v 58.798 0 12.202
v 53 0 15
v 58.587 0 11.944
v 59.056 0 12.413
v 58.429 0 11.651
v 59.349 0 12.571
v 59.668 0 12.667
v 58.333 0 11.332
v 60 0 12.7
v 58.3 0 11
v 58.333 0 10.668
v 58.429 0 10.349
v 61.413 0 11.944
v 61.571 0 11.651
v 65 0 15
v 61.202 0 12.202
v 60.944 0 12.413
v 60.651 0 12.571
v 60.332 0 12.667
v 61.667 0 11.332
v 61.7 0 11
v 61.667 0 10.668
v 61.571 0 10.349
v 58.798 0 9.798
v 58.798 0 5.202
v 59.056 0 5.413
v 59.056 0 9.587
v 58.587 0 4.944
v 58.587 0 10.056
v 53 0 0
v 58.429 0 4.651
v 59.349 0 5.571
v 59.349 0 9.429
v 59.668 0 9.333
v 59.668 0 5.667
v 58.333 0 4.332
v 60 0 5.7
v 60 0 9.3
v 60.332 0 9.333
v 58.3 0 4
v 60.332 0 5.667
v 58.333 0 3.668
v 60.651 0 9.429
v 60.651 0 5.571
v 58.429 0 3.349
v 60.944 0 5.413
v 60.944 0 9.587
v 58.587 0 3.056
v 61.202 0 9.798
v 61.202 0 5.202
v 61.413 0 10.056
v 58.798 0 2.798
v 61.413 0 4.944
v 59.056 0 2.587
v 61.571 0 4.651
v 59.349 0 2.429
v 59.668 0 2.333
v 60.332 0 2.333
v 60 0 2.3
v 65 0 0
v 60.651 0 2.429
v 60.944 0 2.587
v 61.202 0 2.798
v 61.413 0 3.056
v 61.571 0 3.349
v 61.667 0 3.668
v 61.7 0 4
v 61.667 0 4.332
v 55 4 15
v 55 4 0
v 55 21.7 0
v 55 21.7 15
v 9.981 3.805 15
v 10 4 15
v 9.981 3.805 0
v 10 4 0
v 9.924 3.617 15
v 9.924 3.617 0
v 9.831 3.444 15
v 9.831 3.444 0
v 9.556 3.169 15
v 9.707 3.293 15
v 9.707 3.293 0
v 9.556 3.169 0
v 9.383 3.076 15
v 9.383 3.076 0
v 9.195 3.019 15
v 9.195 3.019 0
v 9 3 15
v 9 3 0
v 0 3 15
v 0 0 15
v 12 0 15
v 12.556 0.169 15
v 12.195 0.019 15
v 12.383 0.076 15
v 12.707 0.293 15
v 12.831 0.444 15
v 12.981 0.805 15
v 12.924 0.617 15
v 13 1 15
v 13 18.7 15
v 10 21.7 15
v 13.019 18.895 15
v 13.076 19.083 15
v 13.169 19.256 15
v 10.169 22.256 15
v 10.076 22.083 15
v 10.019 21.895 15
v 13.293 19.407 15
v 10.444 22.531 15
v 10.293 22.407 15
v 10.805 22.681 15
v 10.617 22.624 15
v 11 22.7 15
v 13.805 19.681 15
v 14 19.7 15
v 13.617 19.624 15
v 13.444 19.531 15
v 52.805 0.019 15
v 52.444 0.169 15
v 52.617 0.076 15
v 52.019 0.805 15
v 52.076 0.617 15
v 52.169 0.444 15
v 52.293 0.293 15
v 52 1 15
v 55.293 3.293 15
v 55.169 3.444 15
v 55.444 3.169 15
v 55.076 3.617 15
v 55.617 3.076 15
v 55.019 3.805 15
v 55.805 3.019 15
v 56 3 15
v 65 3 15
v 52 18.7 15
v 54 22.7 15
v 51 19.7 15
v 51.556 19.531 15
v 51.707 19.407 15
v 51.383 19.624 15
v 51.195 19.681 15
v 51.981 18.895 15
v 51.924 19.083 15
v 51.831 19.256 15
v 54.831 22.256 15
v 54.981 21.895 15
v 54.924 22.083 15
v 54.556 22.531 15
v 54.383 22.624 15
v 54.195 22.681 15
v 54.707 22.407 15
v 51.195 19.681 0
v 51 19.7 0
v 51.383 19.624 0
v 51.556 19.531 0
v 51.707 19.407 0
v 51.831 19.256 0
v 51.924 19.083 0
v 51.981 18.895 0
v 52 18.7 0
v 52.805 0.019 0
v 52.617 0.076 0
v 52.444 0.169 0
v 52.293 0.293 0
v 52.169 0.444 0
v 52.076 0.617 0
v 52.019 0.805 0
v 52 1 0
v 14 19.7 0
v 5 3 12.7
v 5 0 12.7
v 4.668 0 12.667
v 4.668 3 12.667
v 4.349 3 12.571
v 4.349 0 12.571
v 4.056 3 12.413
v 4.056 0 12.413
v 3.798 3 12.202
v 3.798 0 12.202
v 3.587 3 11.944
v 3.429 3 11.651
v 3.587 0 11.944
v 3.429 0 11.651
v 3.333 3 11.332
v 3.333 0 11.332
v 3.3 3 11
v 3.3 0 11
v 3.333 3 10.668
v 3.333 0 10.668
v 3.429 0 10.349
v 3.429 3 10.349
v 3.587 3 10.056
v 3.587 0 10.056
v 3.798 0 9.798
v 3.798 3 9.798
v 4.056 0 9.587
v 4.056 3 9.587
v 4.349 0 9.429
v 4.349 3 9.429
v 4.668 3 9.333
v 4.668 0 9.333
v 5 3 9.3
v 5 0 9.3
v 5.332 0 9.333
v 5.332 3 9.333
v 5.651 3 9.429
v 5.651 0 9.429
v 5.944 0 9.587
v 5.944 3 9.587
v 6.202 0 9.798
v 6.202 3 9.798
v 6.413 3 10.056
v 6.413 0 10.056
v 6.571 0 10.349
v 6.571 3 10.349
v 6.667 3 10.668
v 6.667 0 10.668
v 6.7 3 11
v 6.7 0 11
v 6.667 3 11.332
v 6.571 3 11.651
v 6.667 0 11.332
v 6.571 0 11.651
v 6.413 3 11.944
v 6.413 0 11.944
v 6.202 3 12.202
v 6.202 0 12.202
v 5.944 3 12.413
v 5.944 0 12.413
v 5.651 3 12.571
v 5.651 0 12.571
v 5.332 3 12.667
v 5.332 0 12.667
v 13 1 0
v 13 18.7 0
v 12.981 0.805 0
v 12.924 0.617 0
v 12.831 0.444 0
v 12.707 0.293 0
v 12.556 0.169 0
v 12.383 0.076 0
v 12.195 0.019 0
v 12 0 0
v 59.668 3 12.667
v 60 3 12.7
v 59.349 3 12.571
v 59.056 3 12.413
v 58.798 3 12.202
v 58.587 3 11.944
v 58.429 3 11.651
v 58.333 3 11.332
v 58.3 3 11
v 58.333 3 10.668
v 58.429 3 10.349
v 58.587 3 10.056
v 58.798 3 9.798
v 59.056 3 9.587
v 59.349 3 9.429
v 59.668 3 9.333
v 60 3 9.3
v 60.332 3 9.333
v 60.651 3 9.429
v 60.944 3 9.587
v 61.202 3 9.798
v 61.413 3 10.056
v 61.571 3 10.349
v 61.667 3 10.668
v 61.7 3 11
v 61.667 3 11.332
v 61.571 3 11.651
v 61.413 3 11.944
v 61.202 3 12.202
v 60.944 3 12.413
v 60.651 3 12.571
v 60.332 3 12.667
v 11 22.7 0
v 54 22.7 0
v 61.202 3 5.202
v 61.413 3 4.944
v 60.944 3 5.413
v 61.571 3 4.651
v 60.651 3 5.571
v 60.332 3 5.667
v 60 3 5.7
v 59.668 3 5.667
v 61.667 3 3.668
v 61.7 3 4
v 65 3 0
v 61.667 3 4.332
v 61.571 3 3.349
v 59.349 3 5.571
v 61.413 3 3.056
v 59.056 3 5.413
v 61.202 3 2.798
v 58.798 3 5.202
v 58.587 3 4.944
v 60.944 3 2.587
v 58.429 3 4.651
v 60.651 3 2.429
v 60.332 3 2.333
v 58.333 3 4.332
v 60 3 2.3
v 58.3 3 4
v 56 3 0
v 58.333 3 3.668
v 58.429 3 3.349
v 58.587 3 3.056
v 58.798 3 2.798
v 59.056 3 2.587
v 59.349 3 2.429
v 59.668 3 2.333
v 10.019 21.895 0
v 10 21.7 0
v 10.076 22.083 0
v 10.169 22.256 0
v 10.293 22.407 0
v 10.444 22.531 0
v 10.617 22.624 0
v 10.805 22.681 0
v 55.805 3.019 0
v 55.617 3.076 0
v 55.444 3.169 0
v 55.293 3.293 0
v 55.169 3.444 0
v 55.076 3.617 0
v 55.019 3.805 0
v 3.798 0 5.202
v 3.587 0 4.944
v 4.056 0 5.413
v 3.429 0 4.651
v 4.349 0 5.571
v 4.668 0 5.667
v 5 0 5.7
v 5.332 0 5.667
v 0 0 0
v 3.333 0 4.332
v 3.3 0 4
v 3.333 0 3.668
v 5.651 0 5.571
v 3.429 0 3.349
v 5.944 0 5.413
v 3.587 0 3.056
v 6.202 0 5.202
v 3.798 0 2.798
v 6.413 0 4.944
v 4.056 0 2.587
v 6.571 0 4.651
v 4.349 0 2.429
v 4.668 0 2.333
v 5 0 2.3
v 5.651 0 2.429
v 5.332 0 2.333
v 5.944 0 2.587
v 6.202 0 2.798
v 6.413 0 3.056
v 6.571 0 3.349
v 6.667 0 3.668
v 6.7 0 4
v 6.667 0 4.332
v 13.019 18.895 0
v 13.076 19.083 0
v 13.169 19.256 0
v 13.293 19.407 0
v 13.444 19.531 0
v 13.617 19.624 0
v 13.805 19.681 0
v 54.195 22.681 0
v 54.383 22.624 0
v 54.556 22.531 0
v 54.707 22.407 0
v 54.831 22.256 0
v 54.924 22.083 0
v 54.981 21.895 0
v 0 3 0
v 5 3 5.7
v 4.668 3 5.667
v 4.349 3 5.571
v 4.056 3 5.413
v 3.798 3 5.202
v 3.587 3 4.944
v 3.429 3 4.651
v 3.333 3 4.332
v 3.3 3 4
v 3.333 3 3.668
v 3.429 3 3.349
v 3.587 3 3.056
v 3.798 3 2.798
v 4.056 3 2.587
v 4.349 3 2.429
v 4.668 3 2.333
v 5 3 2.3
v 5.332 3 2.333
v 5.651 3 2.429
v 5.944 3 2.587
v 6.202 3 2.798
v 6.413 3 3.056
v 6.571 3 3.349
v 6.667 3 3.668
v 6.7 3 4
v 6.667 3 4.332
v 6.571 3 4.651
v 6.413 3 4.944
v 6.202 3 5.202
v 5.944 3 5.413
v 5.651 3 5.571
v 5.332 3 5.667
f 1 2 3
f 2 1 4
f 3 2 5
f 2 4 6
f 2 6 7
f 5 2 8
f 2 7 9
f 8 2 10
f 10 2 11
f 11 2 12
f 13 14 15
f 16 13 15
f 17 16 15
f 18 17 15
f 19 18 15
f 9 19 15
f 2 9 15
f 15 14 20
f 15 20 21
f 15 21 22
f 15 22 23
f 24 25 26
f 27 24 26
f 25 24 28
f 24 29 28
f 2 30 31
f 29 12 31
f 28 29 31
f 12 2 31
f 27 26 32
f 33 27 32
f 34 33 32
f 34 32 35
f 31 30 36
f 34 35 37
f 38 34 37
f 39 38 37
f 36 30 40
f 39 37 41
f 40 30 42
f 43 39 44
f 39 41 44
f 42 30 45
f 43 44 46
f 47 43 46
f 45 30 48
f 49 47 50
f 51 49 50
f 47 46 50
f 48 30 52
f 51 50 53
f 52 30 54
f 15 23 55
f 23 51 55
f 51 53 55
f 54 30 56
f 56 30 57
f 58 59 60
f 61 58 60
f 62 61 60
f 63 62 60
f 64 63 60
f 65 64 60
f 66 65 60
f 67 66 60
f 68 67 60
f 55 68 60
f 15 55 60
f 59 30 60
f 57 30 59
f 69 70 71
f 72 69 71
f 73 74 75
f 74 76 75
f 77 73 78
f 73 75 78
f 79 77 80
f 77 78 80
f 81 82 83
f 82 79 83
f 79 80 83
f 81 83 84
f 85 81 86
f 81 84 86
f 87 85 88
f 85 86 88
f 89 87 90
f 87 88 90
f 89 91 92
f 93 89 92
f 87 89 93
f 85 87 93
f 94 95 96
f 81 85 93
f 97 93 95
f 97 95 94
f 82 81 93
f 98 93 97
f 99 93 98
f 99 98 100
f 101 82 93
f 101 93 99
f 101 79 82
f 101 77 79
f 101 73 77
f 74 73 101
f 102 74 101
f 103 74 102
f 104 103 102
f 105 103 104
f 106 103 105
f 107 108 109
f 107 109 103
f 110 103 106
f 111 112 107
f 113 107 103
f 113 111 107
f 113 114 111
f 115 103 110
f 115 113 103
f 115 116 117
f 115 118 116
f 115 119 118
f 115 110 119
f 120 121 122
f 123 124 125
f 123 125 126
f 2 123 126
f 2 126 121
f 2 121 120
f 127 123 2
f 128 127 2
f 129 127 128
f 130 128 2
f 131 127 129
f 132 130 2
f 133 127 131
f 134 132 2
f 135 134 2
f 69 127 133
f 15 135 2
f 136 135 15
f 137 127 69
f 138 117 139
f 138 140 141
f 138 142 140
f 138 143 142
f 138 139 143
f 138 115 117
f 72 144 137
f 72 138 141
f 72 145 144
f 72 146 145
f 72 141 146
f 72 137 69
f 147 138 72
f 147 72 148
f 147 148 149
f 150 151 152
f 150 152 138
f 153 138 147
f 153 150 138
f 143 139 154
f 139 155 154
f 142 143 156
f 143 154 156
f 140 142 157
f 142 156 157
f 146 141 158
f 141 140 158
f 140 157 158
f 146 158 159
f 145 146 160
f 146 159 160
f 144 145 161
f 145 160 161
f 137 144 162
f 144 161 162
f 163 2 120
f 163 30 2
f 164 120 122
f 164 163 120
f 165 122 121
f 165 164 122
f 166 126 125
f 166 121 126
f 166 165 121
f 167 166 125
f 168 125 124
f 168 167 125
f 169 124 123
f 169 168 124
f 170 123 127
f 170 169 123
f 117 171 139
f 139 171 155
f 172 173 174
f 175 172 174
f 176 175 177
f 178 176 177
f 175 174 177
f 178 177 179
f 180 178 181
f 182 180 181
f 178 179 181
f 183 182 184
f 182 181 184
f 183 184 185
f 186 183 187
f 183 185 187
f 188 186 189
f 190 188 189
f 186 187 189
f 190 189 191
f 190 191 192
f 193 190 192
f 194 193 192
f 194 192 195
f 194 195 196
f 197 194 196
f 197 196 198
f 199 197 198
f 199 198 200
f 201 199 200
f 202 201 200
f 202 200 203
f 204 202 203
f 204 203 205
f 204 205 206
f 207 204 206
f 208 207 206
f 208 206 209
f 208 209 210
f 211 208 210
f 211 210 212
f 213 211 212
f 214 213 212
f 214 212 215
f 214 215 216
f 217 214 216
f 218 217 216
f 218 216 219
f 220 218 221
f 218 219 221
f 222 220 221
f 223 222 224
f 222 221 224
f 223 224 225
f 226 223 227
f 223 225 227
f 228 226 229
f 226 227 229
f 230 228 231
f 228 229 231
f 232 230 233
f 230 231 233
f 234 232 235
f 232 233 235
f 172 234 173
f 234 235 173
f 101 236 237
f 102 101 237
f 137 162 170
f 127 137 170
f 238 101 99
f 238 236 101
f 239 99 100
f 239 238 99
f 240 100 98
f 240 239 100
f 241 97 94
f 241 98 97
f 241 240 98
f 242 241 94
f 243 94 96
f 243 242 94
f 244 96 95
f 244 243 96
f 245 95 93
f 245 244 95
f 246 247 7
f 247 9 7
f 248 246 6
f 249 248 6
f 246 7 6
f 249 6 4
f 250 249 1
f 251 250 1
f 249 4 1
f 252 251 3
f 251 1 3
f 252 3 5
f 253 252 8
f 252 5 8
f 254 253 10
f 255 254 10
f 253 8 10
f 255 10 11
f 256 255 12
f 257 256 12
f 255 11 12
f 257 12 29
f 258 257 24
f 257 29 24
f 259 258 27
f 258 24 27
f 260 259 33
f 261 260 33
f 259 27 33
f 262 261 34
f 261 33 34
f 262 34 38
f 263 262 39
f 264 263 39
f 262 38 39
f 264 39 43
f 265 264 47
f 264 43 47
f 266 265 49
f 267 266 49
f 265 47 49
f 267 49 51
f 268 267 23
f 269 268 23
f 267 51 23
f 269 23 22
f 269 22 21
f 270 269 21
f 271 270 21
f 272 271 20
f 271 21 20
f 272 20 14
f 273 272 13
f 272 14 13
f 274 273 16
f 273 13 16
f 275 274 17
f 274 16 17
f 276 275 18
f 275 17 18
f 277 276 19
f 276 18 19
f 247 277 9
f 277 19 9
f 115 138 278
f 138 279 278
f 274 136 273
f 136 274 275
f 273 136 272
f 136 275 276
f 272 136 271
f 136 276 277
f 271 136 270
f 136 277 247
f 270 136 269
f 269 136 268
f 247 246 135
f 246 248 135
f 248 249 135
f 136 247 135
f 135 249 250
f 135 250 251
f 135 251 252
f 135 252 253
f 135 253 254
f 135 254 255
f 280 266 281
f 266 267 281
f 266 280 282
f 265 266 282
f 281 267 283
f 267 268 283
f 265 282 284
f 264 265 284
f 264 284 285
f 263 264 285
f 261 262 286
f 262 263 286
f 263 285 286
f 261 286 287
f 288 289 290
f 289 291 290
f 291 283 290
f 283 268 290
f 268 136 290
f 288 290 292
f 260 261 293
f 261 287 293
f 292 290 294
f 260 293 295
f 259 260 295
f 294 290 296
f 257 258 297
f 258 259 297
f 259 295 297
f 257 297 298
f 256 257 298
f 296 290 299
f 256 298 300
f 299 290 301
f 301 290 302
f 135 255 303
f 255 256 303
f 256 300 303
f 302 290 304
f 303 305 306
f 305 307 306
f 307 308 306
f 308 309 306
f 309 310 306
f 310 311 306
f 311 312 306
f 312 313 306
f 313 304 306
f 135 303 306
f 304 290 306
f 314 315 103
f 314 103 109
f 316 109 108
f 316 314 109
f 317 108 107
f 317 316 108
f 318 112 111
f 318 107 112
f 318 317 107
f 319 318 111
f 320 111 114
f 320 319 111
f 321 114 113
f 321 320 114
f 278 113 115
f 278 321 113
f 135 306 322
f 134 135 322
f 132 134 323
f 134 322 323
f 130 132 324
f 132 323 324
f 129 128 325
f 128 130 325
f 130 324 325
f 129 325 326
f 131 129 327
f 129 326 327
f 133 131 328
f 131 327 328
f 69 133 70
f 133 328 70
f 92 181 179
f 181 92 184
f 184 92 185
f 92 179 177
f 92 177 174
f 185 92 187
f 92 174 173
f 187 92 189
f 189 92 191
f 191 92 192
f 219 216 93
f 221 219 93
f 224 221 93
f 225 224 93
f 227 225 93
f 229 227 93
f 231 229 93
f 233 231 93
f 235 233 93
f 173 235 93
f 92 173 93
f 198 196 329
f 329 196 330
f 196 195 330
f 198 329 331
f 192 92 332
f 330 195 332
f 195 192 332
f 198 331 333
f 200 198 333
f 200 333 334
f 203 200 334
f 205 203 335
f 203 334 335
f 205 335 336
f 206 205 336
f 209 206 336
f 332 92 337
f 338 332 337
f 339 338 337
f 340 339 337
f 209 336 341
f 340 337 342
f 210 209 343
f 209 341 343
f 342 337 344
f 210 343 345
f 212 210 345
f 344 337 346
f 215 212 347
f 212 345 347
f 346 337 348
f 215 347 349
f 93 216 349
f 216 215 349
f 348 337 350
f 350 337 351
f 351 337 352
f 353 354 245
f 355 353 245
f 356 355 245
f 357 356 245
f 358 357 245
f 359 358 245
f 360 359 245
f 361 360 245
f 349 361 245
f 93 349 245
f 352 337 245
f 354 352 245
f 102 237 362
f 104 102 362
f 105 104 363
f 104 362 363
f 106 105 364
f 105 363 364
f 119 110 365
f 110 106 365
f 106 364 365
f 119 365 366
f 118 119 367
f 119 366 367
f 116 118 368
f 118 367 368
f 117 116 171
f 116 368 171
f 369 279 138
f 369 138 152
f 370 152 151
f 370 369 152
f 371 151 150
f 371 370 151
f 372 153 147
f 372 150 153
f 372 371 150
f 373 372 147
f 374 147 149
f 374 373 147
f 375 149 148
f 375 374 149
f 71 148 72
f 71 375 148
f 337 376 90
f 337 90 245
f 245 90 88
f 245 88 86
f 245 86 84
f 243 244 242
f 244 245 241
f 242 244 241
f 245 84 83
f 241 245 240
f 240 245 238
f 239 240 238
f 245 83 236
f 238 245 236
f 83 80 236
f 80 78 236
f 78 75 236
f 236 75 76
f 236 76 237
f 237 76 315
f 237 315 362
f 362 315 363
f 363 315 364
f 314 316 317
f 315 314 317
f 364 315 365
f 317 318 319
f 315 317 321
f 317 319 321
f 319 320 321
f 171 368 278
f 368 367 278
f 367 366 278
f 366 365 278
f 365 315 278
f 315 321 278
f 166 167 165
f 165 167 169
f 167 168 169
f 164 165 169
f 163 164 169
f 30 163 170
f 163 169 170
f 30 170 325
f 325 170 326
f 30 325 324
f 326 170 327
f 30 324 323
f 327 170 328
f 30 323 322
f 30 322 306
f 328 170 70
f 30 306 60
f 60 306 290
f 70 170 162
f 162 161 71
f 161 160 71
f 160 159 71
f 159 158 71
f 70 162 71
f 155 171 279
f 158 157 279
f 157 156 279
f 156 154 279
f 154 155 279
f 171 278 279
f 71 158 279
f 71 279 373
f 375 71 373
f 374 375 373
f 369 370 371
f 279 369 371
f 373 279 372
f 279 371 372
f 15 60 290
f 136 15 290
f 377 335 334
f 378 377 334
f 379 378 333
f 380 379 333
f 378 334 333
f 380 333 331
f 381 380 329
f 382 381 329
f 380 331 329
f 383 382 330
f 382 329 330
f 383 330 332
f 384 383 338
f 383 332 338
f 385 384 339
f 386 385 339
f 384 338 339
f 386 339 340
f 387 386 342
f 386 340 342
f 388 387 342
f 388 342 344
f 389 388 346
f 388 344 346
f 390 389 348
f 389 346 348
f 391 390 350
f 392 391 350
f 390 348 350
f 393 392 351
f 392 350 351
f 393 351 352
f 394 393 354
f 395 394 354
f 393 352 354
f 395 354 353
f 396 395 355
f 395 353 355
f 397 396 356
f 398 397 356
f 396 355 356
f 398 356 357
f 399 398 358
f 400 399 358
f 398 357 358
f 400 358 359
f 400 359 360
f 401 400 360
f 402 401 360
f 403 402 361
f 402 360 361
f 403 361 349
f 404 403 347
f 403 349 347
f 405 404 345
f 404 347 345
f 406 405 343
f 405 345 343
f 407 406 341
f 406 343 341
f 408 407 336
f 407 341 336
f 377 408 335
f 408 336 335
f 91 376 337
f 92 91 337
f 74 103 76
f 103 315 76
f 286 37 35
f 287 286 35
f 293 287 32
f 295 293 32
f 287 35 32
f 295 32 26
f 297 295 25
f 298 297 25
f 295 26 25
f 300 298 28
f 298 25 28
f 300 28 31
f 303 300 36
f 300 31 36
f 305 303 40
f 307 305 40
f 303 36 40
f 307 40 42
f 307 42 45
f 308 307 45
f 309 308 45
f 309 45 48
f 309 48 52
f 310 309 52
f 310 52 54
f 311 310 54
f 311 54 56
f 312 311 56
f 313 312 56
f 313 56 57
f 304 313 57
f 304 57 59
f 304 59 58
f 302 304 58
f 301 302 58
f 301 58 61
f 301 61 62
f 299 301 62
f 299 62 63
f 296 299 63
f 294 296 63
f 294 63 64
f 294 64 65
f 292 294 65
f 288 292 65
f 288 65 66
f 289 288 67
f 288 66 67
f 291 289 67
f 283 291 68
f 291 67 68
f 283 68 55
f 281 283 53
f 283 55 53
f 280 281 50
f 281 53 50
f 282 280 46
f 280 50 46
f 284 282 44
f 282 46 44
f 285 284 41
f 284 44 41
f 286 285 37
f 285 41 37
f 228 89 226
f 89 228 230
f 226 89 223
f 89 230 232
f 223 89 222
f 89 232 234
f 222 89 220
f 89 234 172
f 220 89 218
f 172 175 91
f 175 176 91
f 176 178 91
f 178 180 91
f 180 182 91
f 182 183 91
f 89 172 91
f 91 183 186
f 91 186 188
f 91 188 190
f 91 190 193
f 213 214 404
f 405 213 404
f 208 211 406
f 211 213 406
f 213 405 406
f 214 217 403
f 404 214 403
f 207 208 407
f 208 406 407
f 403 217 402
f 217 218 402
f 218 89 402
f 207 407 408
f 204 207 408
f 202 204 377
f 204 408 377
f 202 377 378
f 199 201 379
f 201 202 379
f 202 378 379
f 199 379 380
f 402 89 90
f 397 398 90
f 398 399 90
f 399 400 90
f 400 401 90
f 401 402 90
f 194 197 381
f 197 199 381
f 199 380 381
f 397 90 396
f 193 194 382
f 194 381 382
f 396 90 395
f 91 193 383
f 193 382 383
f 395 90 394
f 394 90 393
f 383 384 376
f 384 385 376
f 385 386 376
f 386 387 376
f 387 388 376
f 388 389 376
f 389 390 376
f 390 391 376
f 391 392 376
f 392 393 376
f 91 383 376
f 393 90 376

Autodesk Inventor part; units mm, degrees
ref_plane "YZ Plane" through (0, 0, 0) normal (1, 0, 0) x (0, 1, 0)
ref_plane "XZ Plane" through (0, 0, 0) normal (0, 1, 0) x (-1, 0, 0)
ref_plane "XY Plane" through (0, 0, 0) normal (0, 0, 1) x (1, 0, 0)
sketch "Sketch1" plane through (0, 0, 0) normal (0, 0, 1) x (1, 0, 0)
  line L0 (0, 0) -> (12, 0)
  line L1 (13, 1) -> (13, 18.7)
  line L2 (14, 19.7) -> (51, 19.7)
  line L3 (52, 18.7) -> (52, 1)
  line L4 (53, 0) -> (65, 0)
  line L5 (65, 0) -> (65, 3)
  line L6 (65, 3) -> (56, 3)
  line L7 (55, 4) -> (55, 21.7)
  line L8 (54, 22.7) -> (11, 22.7)
  line L9 (10, 21.7) -> (10, 4)
  line L10 (9, 3) -> (0, 3)
  line L11 (0, 3) -> (0, 0)
  arc A0 (11, 22.7) -> (10, 21.7) centre (11, 21.7) ccw
  arc A1 (14, 19.7) -> (13, 18.7) centre (14, 18.7) ccw
  arc A2 (9, 3) -> (10, 4) centre (9, 4) ccw
  arc A3 (12, 0) -> (13, 1) centre (12, 1) ccw
  arc A4 (55, 4) -> (56, 3) centre (56, 4) ccw
  arc A5 (55, 21.7) -> (54, 22.7) centre (54, 21.7) ccw
  arc A6 (52, 18.7) -> (51, 19.7) centre (51, 18.7) ccw
  arc A7 (52, 1) -> (53, 0) centre (53, 1) ccw
  point P0 (52, 0)
  dimension "d0" = 3
  dimension "d1" = 3
  dimension "d2" = 3
  dimension "d3" = 3
  dimension "d4" = 3
  dimension "d5" = 19.7
  dimension "d6" = 39
  dimension "d7" = 10
  dimension "d8" = 10
  dimension "d9" = 1
  dimension "d10" = 1
extrude "Extrusion1" add sketch "Sketch1" along normal blind 15
sketch "Sketch2" plane through (0, 3, 0) normal (0, 1, 0) x (1, 0, 0)
  line L0 (65, 0) -> (56, 0) projected
  line L1 (65, -15) -> (56, -15) projected
  line L2 (9, 0) -> (0, 0) projected
  line L3 (9, -15) -> (0, -15) projected
  line L4 (65, 0) -> (65, -15) projected
  line L5 (0, 0) -> (0, -15) projected
  point P0 (60, -4)
  point P1 (60, -11)
  point P2 (5, -11)
  point P3 (5, -4)
  dimension "d13" = 4
  dimension "d14" = 4
  dimension "d15" = 4
  dimension "d16" = 4
  dimension "d17" = 5
  dimension "d18" = 5
  dimension "d19" = 5
  dimension "d20" = 5
hole "Hole1" at (60, 3, 4) at (60, 3, 11) at (5, 3, 11) at (5, 3, 4) direction (0, -1, 0) diameter 3.4 end through all
properties part number "servoPlateConnection"
